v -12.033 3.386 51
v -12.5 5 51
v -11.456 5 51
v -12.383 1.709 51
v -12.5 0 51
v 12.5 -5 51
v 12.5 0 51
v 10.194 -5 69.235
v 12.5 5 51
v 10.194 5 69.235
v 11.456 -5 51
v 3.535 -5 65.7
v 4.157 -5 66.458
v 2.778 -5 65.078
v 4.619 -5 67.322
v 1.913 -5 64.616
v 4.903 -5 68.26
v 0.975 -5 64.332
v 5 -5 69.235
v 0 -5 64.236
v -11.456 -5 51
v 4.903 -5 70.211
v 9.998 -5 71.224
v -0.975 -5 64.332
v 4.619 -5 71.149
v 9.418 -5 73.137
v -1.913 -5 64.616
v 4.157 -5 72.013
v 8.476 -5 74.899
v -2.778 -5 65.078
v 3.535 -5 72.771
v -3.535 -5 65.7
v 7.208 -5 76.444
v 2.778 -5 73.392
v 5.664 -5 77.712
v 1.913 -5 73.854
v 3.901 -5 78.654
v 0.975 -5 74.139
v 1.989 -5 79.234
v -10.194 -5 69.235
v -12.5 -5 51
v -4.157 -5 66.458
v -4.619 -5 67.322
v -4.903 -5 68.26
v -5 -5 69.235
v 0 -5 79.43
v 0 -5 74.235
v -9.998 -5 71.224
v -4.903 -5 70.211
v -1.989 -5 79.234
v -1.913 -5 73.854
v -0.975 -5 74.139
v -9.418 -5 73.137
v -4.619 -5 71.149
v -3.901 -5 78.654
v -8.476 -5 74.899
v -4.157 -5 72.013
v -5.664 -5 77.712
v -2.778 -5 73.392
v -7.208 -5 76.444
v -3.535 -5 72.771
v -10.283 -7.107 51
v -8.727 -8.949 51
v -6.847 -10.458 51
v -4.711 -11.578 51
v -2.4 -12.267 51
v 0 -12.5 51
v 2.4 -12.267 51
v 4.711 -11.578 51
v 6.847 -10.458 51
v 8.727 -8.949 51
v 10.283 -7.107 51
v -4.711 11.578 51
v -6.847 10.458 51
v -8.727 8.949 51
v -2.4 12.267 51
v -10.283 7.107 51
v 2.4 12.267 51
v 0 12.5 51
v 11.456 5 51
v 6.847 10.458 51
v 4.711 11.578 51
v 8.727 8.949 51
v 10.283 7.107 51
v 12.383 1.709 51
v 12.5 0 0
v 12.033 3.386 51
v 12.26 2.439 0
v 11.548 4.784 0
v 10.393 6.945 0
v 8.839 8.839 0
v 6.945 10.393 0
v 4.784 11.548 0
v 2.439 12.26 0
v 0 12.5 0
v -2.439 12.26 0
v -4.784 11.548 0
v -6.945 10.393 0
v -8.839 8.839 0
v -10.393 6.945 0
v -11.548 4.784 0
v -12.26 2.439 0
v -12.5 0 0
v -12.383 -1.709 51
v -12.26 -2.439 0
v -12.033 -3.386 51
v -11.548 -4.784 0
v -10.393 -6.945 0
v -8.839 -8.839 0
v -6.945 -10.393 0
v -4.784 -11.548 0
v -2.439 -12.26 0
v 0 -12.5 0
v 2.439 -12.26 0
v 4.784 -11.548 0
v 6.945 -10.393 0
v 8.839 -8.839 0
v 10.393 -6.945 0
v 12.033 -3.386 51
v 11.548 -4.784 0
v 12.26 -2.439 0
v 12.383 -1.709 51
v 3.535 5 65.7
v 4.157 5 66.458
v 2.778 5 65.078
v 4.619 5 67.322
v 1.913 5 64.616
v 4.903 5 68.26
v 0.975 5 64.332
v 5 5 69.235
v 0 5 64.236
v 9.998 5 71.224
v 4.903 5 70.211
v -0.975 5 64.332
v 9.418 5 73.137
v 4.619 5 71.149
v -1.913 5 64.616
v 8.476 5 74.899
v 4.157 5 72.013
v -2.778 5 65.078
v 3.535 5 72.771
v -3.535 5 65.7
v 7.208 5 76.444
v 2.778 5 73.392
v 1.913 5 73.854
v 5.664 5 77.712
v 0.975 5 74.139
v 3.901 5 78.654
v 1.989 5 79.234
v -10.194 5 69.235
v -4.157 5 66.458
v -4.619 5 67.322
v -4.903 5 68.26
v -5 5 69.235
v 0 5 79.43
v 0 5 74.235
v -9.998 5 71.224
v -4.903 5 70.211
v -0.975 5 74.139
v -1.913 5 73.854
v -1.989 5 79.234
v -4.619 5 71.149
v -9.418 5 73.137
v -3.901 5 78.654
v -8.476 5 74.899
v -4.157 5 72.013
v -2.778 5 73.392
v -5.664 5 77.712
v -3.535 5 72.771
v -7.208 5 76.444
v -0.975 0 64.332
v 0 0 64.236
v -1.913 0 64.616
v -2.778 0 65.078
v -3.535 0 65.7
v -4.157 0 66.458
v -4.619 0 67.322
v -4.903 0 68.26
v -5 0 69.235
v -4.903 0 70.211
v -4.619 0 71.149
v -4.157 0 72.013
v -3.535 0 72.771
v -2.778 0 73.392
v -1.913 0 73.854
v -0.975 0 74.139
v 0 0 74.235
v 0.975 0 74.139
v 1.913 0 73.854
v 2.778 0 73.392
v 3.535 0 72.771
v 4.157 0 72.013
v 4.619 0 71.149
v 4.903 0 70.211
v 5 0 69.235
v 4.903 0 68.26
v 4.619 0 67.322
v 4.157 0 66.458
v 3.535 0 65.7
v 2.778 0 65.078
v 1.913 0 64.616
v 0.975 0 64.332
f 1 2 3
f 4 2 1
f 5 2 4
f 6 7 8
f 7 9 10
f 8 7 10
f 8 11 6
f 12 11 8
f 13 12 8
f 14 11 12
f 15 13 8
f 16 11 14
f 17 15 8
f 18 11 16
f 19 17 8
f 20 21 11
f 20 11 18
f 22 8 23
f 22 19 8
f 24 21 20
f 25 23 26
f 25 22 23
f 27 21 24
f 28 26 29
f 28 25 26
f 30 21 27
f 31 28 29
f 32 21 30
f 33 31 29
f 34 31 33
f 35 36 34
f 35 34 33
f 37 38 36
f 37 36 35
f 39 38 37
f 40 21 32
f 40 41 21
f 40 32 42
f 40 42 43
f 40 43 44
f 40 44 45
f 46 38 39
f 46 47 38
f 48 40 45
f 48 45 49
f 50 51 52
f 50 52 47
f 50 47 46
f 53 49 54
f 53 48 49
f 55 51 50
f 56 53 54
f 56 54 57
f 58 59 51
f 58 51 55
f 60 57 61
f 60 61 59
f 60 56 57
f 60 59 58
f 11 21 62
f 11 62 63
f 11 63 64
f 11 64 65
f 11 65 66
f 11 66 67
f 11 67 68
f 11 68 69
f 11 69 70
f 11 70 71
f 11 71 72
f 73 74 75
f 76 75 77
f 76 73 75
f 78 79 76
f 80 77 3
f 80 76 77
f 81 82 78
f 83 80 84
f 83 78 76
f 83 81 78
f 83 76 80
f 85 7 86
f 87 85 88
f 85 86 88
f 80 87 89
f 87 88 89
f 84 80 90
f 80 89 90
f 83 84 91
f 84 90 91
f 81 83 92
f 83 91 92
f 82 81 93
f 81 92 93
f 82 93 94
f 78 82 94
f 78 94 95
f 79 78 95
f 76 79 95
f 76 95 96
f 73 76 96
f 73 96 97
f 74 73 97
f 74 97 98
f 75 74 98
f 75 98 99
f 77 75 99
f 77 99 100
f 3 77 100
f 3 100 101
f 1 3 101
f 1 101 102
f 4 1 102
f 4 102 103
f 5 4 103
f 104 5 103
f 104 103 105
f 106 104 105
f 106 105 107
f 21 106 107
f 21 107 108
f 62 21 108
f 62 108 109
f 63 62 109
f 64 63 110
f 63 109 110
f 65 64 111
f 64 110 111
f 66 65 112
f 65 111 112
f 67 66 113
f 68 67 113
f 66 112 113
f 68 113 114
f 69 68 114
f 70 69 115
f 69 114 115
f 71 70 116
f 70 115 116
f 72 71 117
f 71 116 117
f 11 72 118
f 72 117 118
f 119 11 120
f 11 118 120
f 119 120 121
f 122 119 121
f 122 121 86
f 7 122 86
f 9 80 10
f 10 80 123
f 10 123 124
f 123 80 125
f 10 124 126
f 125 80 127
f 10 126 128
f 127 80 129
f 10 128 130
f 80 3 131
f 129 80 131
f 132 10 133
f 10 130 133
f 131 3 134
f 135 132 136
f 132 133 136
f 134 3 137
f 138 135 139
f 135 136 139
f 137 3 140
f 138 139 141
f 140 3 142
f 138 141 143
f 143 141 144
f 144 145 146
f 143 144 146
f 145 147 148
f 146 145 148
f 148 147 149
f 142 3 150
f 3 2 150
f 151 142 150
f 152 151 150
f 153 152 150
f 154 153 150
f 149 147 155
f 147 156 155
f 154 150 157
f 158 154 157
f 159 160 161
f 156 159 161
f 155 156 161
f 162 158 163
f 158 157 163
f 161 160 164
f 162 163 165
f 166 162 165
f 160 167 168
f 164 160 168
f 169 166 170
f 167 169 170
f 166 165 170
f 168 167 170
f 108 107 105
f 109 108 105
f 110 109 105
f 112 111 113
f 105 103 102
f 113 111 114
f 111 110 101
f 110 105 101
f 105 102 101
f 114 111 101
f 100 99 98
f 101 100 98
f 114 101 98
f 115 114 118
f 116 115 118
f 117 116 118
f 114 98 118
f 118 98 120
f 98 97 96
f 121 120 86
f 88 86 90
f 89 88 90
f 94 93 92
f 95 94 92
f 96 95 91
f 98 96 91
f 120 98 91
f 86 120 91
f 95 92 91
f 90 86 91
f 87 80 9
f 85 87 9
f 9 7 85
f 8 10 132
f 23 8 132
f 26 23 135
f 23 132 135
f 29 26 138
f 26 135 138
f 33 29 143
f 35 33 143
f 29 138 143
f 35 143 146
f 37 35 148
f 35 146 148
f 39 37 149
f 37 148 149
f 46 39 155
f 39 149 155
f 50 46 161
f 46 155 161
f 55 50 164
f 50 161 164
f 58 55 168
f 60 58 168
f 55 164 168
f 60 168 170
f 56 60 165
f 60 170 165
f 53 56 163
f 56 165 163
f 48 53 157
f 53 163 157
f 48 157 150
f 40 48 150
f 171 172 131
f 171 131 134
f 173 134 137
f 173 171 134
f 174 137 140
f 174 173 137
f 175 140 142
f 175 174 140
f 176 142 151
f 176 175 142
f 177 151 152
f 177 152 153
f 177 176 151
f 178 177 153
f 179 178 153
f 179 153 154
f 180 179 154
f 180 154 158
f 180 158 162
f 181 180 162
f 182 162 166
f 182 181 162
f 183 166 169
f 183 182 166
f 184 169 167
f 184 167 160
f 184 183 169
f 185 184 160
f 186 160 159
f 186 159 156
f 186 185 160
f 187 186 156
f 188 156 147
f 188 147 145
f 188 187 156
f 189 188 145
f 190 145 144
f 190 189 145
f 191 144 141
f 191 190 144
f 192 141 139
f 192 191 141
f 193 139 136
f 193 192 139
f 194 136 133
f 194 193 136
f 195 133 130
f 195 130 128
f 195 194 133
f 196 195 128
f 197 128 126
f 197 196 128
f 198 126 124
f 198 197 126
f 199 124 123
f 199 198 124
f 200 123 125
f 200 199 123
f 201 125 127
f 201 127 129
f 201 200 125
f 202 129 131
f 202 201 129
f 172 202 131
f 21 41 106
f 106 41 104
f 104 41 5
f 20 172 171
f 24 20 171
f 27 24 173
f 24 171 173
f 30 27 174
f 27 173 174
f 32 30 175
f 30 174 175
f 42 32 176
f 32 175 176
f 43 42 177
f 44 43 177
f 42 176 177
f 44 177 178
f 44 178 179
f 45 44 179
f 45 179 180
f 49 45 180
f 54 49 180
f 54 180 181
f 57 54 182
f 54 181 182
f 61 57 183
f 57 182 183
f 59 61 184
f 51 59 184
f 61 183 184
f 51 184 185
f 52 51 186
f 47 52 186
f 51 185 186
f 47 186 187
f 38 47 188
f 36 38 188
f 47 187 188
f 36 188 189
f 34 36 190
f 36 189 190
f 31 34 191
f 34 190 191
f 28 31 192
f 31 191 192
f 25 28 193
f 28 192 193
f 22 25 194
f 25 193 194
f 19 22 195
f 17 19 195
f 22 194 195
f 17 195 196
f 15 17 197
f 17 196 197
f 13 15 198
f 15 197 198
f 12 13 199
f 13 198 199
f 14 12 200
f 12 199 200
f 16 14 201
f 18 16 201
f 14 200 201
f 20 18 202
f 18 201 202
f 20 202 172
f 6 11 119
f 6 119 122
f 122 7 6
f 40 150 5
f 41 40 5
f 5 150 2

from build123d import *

# Parameters (mm, degrees)
SKETCH_1_R           = 12.5
EXTRUDE_1_DEPTH      = 51
EXTRUDE_2_DEPTH      = 5
EXTRUDE_2_DEPTH_BACK = 5
SKETCH_2_R           = 4.999511077


with BuildPart() as part:
    # Эскиз1 → Бобышка-Вытянуть1 (new body)
    with BuildSketch(Plane.XY):
        Circle(SKETCH_1_R)
    extrude(amount=EXTRUDE_1_DEPTH)

    # Эскиз2 → Бобышка-Вытянуть2 (add, two sides: drawn at the far end of the back side and taken through both)
    with BuildSketch(Plane(origin=(0, 0, 0), x_dir=(0, 0, -1), z_dir=(0, 1, 0)).offset(-EXTRUDE_2_DEPTH_BACK)):
        with BuildLine():
            Line((-69.235394105, 10.194154198), (-51, 12.5))
            Line((-51, 12.5), (-51, -12.5))
            Line((-51, -12.5), (-69.235394105, -10.194154198))
            ThreePointArc((-69.235394105, -10.194154198), (-79.429548303, 0), (-69.235394105, 10.194154198))
        make_face()
        with Locations((-69.235394105, 0)):
            Circle(SKETCH_2_R, mode=Mode.SUBTRACT)
    extrude(amount=EXTRUDE_2_DEPTH + EXTRUDE_2_DEPTH_BACK)


solid = part.part
